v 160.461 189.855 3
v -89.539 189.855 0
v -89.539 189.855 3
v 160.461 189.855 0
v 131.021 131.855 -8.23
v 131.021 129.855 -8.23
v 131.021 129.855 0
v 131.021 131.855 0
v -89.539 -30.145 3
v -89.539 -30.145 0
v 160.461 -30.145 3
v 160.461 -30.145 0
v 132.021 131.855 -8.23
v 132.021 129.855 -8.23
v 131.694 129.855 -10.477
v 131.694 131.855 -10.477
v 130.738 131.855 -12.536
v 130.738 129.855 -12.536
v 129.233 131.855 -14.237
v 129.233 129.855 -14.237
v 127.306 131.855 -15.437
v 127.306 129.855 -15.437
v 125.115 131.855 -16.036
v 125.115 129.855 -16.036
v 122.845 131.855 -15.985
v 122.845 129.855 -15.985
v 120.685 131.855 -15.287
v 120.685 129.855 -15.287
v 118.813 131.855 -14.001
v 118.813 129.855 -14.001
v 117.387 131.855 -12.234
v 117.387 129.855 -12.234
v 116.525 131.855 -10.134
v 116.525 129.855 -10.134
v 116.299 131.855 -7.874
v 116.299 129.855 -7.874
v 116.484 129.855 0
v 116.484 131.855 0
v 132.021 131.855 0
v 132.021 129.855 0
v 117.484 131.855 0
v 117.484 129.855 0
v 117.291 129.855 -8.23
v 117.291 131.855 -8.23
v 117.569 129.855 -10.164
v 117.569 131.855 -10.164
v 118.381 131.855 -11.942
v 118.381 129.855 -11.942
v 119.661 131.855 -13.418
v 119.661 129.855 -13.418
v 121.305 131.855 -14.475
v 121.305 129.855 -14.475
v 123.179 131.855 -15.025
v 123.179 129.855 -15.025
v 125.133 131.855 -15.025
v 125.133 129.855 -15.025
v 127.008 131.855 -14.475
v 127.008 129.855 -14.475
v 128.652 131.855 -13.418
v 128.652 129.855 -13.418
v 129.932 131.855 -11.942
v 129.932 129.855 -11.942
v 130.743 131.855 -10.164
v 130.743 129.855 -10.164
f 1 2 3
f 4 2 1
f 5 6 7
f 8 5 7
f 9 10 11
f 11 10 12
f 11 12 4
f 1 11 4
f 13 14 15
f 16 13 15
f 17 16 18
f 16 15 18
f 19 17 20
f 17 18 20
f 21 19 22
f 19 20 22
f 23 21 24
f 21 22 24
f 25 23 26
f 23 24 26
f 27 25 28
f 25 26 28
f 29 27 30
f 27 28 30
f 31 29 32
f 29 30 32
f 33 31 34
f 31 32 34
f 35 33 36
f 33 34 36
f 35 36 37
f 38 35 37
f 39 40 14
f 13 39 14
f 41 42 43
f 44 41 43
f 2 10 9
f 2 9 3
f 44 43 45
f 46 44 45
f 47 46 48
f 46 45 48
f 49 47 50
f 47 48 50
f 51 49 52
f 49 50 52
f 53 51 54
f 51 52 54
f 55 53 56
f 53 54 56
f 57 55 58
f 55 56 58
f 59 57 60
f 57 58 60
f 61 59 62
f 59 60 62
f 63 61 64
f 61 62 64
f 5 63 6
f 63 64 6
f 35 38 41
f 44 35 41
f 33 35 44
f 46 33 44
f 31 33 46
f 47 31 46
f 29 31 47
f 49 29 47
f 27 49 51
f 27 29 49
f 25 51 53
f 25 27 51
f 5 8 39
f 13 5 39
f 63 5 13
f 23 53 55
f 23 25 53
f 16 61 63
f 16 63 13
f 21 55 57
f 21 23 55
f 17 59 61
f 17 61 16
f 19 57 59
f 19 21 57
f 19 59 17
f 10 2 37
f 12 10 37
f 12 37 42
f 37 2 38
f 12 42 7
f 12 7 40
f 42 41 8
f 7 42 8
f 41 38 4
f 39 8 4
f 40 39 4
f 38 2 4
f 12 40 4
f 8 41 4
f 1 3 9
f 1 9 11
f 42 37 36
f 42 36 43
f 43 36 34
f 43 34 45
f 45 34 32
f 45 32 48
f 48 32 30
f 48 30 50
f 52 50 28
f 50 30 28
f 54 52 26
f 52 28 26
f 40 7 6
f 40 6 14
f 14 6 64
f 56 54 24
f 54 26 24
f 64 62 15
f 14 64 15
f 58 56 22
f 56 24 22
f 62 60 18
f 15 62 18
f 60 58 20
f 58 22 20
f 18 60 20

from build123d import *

# Parameters (mm, degrees)
SKETCH1_W           = 250
SKETCH1_H           = 220
BOSS_EXTRUDE1_DEPTH = 3
EXTRUDE_THIN1_DEPTH = 2


with BuildPart() as part:
    # Sketch1 → Boss-Extrude1 (new body)
    with BuildSketch(Plane.XY):
        with Locations((35.461157826, 79.854863969)):
            Rectangle(SKETCH1_W, SKETCH1_H)
    extrude(amount=BOSS_EXTRUDE1_DEPTH)

    # Sketch2 → Extrude-Thin1 (add)
    with BuildSketch(Plane(origin=(0, 129.854863969, 0), x_dir=(1, 0, 0), z_dir=(0, 1, 0))):
        with BuildLine():
            ThreePointArc((117.298879334, 7.909094463), (123.99586371, 15.093149798), (131.021373602, 8.230026488))
            Line((131.021373602, 8.230026488), (131.021373602, 0))
            Line((131.021373602, 0), (132.021373602, 0))
            Line((132.021373602, 0), (132.021373602, 8.230026488))
            ThreePointArc((132.021373602, 8.230026488), (123.972482809, 16.092876428), (116.299972667, 7.862345443))
            Line((116.299972667, 7.862345443), (117.298879334, 7.909094463))
        make_face()
        Polygon((117.483851661, 0), (117.291373602, 8.230026488), (116.291646972, 8.206645586), (116.484125031, -0.023380902), align=None)
    extrude(amount=EXTRUDE_THIN1_DEPTH)


solid = part.part
